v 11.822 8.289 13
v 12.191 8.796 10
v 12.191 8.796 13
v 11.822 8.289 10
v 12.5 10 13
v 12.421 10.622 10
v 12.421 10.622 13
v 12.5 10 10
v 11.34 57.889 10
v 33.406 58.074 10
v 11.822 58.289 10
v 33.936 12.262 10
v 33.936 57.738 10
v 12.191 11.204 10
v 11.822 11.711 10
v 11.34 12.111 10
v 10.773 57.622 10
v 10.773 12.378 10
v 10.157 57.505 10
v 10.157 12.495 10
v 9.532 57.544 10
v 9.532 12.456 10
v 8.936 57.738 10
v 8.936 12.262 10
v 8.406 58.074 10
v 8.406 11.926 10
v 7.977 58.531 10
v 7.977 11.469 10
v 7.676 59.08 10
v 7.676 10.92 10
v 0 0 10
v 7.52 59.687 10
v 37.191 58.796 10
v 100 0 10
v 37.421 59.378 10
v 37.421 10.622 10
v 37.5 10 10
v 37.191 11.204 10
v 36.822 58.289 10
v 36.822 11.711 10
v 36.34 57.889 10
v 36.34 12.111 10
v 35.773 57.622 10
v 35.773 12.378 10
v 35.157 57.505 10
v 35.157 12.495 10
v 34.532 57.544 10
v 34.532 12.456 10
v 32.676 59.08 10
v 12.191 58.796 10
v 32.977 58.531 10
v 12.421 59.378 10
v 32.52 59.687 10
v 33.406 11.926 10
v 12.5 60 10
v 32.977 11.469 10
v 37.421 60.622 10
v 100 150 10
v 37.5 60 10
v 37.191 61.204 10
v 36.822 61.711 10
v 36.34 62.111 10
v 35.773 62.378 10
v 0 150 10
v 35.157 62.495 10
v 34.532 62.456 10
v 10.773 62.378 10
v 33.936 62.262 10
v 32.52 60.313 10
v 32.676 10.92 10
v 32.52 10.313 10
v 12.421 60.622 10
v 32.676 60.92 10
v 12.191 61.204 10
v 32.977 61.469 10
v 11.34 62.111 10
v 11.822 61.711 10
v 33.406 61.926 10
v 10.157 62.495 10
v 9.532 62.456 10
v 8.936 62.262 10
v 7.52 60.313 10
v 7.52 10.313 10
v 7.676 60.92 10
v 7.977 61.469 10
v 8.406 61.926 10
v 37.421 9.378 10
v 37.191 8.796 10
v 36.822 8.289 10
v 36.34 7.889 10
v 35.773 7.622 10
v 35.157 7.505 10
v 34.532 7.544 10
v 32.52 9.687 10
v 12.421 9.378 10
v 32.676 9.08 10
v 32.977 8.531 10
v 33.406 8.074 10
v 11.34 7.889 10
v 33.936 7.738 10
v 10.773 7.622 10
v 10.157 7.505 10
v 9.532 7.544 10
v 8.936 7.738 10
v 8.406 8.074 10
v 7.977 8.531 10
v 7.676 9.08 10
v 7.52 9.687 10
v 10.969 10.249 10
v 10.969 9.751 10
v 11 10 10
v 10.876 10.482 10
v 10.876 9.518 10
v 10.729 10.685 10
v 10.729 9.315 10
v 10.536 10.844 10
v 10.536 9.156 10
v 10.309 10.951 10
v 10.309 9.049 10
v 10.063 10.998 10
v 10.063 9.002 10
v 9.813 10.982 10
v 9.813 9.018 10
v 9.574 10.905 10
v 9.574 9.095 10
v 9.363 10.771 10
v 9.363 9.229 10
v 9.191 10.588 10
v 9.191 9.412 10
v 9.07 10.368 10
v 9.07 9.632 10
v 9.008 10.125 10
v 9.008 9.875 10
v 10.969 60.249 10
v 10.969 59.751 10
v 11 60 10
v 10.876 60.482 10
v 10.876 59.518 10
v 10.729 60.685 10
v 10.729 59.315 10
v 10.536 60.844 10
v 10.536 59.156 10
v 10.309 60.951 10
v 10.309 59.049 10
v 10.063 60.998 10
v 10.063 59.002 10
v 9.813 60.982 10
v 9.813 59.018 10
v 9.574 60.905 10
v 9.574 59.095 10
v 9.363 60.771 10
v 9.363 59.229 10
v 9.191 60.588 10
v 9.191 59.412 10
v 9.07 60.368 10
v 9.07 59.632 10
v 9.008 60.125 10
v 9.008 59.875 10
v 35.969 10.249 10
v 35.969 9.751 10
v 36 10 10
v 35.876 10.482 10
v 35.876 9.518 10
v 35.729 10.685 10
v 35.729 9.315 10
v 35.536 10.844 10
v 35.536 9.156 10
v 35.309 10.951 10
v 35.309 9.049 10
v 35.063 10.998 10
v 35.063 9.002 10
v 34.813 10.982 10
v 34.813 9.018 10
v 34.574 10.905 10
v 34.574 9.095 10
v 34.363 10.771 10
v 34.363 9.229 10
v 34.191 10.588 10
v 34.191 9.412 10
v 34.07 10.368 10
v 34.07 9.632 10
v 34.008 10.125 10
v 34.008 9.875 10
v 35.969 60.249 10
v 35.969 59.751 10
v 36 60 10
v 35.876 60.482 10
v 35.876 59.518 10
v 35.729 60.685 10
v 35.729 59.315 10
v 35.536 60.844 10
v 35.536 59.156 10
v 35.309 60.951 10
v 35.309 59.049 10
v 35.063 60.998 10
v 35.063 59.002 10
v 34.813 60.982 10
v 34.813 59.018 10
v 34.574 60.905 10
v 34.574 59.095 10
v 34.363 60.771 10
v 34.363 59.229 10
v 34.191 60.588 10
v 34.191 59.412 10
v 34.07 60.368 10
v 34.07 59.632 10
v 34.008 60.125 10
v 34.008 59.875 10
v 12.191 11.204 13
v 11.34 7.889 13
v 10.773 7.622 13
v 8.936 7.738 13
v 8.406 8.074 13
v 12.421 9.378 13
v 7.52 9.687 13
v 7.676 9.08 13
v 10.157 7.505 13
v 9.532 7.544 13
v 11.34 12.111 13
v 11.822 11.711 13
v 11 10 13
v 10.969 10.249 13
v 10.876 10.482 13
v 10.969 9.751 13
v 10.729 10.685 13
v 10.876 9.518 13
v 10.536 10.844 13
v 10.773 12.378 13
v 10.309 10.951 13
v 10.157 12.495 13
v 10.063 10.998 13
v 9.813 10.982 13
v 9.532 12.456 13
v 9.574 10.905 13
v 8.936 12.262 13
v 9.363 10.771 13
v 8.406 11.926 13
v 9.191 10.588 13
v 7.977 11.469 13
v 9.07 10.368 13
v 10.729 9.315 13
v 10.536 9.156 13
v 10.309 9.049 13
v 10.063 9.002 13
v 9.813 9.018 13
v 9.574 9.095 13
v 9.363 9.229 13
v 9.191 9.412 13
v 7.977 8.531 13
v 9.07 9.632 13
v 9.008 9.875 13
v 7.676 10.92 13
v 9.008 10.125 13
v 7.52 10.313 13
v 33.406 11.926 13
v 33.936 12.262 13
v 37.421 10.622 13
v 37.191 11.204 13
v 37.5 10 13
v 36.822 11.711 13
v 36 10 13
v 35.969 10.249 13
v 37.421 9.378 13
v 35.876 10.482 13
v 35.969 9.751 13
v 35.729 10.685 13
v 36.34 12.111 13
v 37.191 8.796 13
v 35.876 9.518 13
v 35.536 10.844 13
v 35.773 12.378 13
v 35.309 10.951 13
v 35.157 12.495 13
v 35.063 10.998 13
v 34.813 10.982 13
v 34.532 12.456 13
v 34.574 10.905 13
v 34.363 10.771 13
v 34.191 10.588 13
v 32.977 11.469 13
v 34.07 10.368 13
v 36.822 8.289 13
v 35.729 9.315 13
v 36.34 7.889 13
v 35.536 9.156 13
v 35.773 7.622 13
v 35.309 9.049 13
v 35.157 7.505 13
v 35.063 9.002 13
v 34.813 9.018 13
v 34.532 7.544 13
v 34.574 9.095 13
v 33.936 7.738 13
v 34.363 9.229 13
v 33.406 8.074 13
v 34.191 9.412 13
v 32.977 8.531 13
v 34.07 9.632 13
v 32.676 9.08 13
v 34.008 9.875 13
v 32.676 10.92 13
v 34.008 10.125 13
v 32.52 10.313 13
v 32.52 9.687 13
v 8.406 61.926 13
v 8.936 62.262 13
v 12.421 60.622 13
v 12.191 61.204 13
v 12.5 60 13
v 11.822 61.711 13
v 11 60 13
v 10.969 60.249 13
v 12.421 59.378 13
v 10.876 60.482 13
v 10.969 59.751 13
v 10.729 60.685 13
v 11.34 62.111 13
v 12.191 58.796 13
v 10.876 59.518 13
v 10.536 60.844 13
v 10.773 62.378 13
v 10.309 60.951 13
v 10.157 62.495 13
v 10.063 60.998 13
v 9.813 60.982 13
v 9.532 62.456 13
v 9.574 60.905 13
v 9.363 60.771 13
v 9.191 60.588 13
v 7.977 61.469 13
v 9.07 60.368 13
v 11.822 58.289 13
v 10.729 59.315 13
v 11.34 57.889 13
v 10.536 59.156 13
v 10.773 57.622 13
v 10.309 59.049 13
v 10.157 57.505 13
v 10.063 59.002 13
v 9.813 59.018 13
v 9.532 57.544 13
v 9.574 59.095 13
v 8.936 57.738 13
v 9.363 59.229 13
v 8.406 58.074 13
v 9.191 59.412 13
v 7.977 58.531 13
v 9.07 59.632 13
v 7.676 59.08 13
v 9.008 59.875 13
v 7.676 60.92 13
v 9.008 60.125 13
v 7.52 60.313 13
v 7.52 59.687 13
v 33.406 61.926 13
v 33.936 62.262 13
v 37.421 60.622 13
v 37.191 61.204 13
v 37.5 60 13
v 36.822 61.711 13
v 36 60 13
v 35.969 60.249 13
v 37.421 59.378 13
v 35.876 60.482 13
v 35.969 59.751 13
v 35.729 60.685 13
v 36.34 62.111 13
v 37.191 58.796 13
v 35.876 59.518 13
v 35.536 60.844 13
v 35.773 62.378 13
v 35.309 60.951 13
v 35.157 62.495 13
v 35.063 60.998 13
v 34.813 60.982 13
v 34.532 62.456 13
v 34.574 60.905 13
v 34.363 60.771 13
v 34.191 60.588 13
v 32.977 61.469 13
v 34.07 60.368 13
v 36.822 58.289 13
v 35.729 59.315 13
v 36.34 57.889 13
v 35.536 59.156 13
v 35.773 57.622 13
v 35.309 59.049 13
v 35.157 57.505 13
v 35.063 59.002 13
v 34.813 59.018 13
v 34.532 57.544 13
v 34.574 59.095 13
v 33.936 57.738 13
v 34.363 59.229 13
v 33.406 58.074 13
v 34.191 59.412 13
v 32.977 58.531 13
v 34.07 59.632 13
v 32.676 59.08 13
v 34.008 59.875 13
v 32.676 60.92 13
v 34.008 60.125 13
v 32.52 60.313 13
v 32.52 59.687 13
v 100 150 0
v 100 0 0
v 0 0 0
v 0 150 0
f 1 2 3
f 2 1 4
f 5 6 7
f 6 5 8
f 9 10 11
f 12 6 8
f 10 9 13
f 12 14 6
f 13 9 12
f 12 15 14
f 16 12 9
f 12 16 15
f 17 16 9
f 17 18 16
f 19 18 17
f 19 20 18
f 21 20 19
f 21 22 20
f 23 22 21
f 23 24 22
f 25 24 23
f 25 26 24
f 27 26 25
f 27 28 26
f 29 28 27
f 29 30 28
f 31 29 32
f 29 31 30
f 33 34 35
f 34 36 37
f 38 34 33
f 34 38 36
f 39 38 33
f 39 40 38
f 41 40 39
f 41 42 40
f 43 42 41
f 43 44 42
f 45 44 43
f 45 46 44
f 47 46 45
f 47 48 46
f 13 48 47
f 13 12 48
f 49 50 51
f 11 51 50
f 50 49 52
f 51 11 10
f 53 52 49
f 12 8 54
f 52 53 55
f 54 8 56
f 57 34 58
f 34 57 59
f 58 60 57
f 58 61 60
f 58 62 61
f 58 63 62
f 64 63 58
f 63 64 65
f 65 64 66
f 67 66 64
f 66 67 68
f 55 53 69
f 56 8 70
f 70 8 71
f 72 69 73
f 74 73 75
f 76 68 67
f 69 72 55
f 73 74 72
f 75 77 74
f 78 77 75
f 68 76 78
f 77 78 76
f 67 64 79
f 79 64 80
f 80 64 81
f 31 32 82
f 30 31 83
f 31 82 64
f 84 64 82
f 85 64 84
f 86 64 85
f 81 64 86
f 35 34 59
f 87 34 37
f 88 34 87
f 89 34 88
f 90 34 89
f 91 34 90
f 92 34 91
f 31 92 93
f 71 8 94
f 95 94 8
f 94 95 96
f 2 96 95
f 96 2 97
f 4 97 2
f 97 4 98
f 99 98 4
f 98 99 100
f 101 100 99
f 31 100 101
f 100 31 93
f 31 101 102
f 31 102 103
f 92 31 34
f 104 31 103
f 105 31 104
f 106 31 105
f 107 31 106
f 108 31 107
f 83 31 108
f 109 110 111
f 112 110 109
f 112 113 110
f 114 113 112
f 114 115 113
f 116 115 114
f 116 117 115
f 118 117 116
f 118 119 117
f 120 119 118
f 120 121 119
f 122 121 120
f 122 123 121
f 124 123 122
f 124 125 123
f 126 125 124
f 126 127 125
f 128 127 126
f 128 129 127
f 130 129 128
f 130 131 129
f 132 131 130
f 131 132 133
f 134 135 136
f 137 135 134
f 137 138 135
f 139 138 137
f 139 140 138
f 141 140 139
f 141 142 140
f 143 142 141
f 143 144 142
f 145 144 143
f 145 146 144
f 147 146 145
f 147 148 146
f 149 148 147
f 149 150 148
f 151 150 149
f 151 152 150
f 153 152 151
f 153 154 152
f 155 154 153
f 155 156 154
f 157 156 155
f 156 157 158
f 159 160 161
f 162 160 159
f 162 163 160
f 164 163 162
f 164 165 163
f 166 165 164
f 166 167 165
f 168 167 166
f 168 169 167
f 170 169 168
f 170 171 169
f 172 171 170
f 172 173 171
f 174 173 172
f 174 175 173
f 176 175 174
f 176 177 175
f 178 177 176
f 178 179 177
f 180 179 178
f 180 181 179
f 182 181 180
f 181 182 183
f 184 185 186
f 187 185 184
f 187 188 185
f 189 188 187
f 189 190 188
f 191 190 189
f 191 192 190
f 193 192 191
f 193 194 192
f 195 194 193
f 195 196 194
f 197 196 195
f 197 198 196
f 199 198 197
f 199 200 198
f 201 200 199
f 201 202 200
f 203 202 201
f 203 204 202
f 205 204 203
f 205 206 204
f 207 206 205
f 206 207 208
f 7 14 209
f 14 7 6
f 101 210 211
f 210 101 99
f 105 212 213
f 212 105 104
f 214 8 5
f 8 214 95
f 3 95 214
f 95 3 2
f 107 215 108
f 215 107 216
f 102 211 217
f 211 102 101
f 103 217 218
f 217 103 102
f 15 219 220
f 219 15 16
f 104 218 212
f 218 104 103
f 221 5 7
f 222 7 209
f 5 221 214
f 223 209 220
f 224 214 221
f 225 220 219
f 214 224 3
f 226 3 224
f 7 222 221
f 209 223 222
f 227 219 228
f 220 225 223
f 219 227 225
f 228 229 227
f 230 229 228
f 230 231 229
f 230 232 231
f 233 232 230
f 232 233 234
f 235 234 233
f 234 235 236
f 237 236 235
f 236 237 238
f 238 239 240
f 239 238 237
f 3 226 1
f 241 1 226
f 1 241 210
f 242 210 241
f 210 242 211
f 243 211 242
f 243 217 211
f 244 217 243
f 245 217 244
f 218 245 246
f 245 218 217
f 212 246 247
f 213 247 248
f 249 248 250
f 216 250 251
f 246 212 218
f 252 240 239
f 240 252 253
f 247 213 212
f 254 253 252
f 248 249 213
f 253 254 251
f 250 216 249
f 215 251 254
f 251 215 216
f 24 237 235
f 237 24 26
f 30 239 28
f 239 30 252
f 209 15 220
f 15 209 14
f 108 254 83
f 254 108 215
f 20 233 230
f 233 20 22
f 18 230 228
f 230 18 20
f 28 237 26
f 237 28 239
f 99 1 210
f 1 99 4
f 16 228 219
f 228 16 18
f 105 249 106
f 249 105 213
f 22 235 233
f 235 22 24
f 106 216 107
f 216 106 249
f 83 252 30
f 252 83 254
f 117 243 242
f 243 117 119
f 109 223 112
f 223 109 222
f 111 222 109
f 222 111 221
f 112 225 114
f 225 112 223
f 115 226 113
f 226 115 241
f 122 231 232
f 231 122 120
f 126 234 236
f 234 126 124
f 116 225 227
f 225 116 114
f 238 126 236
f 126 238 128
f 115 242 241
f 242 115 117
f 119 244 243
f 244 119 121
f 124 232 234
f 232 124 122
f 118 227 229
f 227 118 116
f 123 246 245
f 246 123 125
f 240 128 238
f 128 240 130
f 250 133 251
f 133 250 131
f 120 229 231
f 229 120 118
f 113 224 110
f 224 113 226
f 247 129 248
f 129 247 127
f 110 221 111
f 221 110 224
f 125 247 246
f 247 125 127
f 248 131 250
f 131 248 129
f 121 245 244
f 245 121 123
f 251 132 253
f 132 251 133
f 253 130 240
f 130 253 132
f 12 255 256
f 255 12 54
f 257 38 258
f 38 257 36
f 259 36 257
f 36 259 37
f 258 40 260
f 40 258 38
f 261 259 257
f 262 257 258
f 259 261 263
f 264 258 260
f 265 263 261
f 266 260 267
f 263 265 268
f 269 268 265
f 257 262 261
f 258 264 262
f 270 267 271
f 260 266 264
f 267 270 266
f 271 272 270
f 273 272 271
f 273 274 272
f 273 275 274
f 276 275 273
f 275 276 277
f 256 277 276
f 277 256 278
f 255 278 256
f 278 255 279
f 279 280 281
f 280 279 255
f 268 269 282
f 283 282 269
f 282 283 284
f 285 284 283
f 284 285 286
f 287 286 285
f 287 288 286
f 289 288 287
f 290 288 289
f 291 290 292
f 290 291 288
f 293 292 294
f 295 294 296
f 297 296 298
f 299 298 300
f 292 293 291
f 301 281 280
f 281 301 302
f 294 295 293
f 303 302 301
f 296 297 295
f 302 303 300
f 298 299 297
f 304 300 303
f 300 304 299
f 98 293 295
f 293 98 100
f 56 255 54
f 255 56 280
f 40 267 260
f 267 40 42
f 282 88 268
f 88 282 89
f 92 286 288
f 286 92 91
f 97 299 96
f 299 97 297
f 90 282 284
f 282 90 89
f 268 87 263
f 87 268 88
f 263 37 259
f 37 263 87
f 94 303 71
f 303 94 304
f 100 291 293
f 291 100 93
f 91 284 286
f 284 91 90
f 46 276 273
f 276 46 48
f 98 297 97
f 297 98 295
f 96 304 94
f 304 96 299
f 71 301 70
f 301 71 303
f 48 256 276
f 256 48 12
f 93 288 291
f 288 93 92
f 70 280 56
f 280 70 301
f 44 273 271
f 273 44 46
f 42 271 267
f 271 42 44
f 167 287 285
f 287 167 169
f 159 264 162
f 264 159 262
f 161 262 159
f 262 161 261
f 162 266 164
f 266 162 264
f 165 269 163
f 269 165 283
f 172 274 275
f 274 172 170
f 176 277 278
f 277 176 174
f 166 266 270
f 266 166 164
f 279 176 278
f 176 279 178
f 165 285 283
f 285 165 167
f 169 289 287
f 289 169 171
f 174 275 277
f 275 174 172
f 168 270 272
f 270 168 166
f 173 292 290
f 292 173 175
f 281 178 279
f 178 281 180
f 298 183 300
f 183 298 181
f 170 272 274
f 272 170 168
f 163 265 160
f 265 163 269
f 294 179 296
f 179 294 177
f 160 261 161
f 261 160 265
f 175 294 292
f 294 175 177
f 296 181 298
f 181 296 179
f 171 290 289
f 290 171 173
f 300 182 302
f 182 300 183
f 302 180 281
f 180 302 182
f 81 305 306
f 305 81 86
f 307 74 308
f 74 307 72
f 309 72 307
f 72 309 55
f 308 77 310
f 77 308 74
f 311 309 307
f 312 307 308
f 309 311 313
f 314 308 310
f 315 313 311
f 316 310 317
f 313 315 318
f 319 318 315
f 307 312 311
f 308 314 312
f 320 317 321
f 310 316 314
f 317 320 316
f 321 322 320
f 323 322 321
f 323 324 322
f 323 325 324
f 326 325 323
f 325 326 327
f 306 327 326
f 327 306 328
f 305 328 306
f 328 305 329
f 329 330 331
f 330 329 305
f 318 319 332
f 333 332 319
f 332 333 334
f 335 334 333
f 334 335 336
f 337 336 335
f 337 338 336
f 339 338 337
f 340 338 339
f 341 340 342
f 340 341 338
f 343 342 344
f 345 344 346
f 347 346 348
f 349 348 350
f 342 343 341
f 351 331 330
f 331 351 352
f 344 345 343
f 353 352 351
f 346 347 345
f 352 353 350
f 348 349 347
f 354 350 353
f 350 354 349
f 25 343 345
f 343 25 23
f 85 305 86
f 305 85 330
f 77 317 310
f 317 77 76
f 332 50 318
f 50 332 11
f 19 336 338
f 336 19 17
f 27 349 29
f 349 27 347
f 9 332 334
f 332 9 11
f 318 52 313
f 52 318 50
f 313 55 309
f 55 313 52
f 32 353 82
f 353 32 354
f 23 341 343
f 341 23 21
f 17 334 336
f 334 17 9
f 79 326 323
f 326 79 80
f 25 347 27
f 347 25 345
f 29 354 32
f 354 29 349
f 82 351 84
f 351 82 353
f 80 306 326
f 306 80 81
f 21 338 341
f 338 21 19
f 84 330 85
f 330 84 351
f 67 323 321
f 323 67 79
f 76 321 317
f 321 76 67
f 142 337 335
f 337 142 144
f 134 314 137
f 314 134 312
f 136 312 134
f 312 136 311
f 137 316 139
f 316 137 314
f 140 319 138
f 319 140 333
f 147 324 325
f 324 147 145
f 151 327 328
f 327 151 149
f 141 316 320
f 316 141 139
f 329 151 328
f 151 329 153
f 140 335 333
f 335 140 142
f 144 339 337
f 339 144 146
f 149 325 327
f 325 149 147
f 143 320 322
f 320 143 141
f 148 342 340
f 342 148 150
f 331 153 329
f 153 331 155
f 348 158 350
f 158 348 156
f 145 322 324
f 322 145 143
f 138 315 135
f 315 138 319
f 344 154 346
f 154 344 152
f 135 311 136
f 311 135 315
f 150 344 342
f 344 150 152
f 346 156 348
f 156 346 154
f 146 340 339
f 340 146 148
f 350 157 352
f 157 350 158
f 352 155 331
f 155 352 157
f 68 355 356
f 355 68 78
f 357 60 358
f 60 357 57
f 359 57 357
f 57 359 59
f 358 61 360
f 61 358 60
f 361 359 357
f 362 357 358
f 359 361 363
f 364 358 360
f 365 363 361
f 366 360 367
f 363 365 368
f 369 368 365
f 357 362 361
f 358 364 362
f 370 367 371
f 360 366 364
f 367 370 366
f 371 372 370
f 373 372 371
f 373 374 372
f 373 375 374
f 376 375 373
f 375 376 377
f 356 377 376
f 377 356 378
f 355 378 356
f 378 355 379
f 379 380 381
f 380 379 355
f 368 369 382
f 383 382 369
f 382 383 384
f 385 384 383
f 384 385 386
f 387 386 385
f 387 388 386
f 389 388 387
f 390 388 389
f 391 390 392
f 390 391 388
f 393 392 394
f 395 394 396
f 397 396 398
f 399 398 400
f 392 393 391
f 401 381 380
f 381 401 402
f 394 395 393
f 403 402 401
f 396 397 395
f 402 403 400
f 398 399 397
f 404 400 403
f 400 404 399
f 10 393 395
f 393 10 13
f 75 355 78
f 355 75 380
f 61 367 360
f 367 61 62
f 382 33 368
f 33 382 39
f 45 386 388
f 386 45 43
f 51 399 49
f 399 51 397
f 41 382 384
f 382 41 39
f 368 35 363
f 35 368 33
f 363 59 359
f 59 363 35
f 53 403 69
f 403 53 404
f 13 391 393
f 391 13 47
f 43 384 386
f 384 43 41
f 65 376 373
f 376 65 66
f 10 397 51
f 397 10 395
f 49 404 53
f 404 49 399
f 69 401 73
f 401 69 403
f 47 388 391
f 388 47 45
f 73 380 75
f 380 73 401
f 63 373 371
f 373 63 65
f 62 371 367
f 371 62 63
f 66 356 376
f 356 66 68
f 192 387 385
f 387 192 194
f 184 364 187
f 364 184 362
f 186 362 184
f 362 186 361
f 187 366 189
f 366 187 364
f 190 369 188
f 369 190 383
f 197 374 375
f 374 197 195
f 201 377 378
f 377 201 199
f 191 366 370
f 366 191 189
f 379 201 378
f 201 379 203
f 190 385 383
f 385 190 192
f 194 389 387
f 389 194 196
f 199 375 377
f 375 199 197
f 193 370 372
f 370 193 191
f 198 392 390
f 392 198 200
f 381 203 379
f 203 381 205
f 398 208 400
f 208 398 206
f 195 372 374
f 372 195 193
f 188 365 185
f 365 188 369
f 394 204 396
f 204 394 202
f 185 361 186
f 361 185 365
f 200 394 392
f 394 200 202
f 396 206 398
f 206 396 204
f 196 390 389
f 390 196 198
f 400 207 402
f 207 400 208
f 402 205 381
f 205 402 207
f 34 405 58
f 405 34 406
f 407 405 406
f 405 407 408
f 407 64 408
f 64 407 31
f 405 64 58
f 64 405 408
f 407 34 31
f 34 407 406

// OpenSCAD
//Example shape to put standoffs on
cube([100,150,10]);

//Standoff module
module standoff(height, diameter, holediameter, firstTX, firstTY, firstTZ, pcbWidth, pcbLength, fn=25){
    //Standoff 1
    difference(){
        translate([firstTX, firstTY, firstTZ])
            cylinder(h=height, d=diameter, $fn = fn);
        
        translate([firstTX, firstTY, firstTZ])
            cylinder(h=height, d=holediameter, $fn = fn);
    }
    //Standoff 2
    difference(){
        translate([firstTX+pcbWidth, firstTY, firstTZ])
            cylinder(h=height, d=diameter, $fn = fn);
        
        translate([firstTX+pcbWidth, firstTY, firstTZ])
            cylinder(h=height, d=holediameter, $fn = fn);
    }
    //Standoff 3
    difference(){
        translate([firstTX, firstTY+pcbLength, firstTZ])
            cylinder(h=height, d=diameter, $fn = fn);
        
        translate([firstTX, firstTY+pcbLength, firstTZ])
            cylinder(h=height, d=holediameter, $fn = fn);
    }
    //Standoff 4
    difference(){
        translate([firstTX+pcbWidth, firstTY+pcbLength, firstTZ])
            cylinder(h=height, d=diameter, $fn = fn);
        
        translate([firstTX+pcbWidth, firstTY+pcbLength, firstTZ])
            cylinder(h=height, d=holediameter, $fn = fn);
    }
}

//Example use of module
standoff(
     height = 3
    ,diameter = 5
    ,holediameter = 2
    ,firstTX = 10
    ,firstTY = 10
    ,firstTZ = 10
    ,pcbWidth = 25
    ,pcbLength = 50
    ,fn = 25
);
